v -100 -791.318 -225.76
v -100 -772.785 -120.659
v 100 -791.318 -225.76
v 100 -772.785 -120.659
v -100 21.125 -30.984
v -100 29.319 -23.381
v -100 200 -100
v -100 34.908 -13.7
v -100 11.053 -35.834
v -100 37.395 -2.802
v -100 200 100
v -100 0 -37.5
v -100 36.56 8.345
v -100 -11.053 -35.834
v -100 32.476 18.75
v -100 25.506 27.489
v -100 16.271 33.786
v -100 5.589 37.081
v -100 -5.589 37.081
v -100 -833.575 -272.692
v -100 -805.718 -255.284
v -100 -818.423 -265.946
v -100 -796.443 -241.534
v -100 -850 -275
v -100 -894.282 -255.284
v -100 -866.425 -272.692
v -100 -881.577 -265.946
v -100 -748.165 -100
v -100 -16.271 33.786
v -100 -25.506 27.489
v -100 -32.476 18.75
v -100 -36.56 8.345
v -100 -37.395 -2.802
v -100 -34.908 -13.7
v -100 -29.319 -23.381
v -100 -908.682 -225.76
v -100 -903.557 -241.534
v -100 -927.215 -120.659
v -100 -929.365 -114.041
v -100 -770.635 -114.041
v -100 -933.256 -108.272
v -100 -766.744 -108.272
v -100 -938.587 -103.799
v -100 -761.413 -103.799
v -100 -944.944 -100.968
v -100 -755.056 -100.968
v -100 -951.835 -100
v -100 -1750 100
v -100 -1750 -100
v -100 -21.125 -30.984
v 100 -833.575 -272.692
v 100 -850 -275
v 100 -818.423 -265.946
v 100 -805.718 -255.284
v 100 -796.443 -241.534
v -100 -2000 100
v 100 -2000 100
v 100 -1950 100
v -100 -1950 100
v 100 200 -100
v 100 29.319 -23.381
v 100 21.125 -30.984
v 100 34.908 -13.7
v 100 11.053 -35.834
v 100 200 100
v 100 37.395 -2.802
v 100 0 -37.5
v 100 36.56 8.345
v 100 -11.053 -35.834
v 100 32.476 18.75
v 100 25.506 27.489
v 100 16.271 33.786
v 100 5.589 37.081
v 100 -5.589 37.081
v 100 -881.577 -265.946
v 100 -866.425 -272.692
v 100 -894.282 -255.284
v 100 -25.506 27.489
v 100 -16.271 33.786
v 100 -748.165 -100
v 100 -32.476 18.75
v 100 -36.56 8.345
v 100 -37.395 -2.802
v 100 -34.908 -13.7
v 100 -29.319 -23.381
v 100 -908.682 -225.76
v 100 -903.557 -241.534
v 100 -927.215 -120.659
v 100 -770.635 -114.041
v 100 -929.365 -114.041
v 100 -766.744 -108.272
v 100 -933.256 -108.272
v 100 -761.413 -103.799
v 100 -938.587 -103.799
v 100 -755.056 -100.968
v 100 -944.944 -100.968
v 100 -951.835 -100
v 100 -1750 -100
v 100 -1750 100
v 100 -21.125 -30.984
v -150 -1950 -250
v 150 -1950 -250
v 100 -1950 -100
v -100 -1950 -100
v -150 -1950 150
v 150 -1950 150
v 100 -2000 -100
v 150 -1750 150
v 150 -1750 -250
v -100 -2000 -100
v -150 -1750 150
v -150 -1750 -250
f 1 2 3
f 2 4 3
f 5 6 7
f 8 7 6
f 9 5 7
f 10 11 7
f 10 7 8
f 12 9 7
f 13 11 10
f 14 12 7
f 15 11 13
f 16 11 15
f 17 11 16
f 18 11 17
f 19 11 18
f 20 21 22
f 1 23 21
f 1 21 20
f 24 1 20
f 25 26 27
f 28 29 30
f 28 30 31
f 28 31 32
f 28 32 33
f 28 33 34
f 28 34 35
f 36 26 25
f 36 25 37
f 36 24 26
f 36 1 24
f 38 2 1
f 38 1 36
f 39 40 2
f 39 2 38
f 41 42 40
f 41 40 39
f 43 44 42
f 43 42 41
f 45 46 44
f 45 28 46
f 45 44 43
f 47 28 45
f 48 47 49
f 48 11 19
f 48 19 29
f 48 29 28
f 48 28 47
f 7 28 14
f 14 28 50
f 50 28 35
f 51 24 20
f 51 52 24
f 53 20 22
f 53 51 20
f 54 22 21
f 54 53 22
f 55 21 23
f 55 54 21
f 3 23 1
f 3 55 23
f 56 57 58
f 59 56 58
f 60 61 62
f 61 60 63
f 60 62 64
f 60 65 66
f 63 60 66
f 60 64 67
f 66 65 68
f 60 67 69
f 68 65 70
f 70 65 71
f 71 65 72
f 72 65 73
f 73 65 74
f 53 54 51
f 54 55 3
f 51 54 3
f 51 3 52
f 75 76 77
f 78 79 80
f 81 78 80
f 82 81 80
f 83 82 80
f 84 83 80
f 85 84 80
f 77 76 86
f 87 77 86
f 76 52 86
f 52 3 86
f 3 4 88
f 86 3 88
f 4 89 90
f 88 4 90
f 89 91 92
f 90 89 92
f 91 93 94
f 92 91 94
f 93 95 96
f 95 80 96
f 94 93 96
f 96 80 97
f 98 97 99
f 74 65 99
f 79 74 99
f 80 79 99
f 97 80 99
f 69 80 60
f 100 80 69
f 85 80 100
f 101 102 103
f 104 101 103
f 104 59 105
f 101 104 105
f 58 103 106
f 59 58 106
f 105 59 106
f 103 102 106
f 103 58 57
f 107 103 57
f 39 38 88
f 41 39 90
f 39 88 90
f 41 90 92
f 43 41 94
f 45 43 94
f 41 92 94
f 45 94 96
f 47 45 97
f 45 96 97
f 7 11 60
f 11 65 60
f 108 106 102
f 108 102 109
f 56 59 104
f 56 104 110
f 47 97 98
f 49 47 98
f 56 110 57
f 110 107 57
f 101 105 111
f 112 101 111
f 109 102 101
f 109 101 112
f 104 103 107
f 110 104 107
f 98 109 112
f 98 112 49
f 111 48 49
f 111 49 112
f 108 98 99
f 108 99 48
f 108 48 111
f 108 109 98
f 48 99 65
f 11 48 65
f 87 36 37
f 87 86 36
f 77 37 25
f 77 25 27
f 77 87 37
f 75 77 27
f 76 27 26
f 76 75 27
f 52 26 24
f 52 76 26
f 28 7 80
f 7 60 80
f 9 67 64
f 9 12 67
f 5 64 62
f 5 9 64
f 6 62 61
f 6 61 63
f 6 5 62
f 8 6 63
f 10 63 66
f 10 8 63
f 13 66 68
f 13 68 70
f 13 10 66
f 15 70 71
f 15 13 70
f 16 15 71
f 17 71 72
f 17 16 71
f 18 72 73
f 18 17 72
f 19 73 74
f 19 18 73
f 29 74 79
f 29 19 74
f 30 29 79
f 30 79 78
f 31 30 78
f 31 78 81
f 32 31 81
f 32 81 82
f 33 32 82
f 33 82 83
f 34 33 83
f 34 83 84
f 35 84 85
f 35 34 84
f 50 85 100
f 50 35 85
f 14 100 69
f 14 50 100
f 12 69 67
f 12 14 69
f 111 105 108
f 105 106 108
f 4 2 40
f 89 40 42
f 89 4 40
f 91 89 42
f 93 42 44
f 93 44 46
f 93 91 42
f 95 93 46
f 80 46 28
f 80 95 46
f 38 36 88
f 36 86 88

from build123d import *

# Parameters (mm, degrees)
SKETCH1_R           = 37.5
BOSS_EXTRUDE1_DEPTH = 100
DRAFT1_ANGLE        = 10
SKETCH1_3_W         = 200
SKETCH1_3_H         = 400
BOSS_EXTRUDE2_DEPTH = 150
FILLET1_R           = 59.58768
FILLET2_R           = 25


with BuildPart() as part:
    # Sketch1 → Boss-Extrude1 (new, symmetric)
    with BuildSketch(Plane.YZ):
        Polygon((-900, -100), (-2000, -100), (-2000, 100), (200, 100), (200, -100), (-800, -100), (-800, -275), (-900, -275), align=None)
        with Locations(Location((0, 0, 0), (0, 0, 270))):
            Circle(SKETCH1_R, mode=Mode.SUBTRACT)
    extrude(amount=BOSS_EXTRUDE1_DEPTH, both=True)

    # Draft1
    draft1_faces = [part.faces().sort_by_distance(p)[0] for p in [
        (0, -800, -187.5),
        (0, -900, -187.5),
    ]]
    draft(draft1_faces, Plane(origin=(100, 0, -275), x_dir=(-1, 0, 0), z_dir=(0, 0, -1)), DRAFT1_ANGLE)

    # Sketch1<3> → Boss-Extrude2 (add, symmetric)
    with BuildSketch(Plane.YZ):
        with Locations((-1850, -50)):
            Rectangle(SKETCH1_3_W, SKETCH1_3_H)
    extrude(amount=BOSS_EXTRUDE2_DEPTH, both=True)

    # Fillet1
    fillet1_edges = [part.edges().sort_by_distance(p)[0] for p in [
        (0, -800, -275),
        (0, -900, -275),
    ]]
    fillet(fillet1_edges, radius=FILLET1_R - 0.0001)  # a hair under: the kernel refuses the full size

    # Fillet2
    fillet2_edges = [part.edges().sort_by_distance(p)[0] for p in [
        (0, -769.142778376, -100),
        (0, -930.857221624, -100),
    ]]
    fillet(fillet2_edges, radius=FILLET2_R)


solid = part.part
